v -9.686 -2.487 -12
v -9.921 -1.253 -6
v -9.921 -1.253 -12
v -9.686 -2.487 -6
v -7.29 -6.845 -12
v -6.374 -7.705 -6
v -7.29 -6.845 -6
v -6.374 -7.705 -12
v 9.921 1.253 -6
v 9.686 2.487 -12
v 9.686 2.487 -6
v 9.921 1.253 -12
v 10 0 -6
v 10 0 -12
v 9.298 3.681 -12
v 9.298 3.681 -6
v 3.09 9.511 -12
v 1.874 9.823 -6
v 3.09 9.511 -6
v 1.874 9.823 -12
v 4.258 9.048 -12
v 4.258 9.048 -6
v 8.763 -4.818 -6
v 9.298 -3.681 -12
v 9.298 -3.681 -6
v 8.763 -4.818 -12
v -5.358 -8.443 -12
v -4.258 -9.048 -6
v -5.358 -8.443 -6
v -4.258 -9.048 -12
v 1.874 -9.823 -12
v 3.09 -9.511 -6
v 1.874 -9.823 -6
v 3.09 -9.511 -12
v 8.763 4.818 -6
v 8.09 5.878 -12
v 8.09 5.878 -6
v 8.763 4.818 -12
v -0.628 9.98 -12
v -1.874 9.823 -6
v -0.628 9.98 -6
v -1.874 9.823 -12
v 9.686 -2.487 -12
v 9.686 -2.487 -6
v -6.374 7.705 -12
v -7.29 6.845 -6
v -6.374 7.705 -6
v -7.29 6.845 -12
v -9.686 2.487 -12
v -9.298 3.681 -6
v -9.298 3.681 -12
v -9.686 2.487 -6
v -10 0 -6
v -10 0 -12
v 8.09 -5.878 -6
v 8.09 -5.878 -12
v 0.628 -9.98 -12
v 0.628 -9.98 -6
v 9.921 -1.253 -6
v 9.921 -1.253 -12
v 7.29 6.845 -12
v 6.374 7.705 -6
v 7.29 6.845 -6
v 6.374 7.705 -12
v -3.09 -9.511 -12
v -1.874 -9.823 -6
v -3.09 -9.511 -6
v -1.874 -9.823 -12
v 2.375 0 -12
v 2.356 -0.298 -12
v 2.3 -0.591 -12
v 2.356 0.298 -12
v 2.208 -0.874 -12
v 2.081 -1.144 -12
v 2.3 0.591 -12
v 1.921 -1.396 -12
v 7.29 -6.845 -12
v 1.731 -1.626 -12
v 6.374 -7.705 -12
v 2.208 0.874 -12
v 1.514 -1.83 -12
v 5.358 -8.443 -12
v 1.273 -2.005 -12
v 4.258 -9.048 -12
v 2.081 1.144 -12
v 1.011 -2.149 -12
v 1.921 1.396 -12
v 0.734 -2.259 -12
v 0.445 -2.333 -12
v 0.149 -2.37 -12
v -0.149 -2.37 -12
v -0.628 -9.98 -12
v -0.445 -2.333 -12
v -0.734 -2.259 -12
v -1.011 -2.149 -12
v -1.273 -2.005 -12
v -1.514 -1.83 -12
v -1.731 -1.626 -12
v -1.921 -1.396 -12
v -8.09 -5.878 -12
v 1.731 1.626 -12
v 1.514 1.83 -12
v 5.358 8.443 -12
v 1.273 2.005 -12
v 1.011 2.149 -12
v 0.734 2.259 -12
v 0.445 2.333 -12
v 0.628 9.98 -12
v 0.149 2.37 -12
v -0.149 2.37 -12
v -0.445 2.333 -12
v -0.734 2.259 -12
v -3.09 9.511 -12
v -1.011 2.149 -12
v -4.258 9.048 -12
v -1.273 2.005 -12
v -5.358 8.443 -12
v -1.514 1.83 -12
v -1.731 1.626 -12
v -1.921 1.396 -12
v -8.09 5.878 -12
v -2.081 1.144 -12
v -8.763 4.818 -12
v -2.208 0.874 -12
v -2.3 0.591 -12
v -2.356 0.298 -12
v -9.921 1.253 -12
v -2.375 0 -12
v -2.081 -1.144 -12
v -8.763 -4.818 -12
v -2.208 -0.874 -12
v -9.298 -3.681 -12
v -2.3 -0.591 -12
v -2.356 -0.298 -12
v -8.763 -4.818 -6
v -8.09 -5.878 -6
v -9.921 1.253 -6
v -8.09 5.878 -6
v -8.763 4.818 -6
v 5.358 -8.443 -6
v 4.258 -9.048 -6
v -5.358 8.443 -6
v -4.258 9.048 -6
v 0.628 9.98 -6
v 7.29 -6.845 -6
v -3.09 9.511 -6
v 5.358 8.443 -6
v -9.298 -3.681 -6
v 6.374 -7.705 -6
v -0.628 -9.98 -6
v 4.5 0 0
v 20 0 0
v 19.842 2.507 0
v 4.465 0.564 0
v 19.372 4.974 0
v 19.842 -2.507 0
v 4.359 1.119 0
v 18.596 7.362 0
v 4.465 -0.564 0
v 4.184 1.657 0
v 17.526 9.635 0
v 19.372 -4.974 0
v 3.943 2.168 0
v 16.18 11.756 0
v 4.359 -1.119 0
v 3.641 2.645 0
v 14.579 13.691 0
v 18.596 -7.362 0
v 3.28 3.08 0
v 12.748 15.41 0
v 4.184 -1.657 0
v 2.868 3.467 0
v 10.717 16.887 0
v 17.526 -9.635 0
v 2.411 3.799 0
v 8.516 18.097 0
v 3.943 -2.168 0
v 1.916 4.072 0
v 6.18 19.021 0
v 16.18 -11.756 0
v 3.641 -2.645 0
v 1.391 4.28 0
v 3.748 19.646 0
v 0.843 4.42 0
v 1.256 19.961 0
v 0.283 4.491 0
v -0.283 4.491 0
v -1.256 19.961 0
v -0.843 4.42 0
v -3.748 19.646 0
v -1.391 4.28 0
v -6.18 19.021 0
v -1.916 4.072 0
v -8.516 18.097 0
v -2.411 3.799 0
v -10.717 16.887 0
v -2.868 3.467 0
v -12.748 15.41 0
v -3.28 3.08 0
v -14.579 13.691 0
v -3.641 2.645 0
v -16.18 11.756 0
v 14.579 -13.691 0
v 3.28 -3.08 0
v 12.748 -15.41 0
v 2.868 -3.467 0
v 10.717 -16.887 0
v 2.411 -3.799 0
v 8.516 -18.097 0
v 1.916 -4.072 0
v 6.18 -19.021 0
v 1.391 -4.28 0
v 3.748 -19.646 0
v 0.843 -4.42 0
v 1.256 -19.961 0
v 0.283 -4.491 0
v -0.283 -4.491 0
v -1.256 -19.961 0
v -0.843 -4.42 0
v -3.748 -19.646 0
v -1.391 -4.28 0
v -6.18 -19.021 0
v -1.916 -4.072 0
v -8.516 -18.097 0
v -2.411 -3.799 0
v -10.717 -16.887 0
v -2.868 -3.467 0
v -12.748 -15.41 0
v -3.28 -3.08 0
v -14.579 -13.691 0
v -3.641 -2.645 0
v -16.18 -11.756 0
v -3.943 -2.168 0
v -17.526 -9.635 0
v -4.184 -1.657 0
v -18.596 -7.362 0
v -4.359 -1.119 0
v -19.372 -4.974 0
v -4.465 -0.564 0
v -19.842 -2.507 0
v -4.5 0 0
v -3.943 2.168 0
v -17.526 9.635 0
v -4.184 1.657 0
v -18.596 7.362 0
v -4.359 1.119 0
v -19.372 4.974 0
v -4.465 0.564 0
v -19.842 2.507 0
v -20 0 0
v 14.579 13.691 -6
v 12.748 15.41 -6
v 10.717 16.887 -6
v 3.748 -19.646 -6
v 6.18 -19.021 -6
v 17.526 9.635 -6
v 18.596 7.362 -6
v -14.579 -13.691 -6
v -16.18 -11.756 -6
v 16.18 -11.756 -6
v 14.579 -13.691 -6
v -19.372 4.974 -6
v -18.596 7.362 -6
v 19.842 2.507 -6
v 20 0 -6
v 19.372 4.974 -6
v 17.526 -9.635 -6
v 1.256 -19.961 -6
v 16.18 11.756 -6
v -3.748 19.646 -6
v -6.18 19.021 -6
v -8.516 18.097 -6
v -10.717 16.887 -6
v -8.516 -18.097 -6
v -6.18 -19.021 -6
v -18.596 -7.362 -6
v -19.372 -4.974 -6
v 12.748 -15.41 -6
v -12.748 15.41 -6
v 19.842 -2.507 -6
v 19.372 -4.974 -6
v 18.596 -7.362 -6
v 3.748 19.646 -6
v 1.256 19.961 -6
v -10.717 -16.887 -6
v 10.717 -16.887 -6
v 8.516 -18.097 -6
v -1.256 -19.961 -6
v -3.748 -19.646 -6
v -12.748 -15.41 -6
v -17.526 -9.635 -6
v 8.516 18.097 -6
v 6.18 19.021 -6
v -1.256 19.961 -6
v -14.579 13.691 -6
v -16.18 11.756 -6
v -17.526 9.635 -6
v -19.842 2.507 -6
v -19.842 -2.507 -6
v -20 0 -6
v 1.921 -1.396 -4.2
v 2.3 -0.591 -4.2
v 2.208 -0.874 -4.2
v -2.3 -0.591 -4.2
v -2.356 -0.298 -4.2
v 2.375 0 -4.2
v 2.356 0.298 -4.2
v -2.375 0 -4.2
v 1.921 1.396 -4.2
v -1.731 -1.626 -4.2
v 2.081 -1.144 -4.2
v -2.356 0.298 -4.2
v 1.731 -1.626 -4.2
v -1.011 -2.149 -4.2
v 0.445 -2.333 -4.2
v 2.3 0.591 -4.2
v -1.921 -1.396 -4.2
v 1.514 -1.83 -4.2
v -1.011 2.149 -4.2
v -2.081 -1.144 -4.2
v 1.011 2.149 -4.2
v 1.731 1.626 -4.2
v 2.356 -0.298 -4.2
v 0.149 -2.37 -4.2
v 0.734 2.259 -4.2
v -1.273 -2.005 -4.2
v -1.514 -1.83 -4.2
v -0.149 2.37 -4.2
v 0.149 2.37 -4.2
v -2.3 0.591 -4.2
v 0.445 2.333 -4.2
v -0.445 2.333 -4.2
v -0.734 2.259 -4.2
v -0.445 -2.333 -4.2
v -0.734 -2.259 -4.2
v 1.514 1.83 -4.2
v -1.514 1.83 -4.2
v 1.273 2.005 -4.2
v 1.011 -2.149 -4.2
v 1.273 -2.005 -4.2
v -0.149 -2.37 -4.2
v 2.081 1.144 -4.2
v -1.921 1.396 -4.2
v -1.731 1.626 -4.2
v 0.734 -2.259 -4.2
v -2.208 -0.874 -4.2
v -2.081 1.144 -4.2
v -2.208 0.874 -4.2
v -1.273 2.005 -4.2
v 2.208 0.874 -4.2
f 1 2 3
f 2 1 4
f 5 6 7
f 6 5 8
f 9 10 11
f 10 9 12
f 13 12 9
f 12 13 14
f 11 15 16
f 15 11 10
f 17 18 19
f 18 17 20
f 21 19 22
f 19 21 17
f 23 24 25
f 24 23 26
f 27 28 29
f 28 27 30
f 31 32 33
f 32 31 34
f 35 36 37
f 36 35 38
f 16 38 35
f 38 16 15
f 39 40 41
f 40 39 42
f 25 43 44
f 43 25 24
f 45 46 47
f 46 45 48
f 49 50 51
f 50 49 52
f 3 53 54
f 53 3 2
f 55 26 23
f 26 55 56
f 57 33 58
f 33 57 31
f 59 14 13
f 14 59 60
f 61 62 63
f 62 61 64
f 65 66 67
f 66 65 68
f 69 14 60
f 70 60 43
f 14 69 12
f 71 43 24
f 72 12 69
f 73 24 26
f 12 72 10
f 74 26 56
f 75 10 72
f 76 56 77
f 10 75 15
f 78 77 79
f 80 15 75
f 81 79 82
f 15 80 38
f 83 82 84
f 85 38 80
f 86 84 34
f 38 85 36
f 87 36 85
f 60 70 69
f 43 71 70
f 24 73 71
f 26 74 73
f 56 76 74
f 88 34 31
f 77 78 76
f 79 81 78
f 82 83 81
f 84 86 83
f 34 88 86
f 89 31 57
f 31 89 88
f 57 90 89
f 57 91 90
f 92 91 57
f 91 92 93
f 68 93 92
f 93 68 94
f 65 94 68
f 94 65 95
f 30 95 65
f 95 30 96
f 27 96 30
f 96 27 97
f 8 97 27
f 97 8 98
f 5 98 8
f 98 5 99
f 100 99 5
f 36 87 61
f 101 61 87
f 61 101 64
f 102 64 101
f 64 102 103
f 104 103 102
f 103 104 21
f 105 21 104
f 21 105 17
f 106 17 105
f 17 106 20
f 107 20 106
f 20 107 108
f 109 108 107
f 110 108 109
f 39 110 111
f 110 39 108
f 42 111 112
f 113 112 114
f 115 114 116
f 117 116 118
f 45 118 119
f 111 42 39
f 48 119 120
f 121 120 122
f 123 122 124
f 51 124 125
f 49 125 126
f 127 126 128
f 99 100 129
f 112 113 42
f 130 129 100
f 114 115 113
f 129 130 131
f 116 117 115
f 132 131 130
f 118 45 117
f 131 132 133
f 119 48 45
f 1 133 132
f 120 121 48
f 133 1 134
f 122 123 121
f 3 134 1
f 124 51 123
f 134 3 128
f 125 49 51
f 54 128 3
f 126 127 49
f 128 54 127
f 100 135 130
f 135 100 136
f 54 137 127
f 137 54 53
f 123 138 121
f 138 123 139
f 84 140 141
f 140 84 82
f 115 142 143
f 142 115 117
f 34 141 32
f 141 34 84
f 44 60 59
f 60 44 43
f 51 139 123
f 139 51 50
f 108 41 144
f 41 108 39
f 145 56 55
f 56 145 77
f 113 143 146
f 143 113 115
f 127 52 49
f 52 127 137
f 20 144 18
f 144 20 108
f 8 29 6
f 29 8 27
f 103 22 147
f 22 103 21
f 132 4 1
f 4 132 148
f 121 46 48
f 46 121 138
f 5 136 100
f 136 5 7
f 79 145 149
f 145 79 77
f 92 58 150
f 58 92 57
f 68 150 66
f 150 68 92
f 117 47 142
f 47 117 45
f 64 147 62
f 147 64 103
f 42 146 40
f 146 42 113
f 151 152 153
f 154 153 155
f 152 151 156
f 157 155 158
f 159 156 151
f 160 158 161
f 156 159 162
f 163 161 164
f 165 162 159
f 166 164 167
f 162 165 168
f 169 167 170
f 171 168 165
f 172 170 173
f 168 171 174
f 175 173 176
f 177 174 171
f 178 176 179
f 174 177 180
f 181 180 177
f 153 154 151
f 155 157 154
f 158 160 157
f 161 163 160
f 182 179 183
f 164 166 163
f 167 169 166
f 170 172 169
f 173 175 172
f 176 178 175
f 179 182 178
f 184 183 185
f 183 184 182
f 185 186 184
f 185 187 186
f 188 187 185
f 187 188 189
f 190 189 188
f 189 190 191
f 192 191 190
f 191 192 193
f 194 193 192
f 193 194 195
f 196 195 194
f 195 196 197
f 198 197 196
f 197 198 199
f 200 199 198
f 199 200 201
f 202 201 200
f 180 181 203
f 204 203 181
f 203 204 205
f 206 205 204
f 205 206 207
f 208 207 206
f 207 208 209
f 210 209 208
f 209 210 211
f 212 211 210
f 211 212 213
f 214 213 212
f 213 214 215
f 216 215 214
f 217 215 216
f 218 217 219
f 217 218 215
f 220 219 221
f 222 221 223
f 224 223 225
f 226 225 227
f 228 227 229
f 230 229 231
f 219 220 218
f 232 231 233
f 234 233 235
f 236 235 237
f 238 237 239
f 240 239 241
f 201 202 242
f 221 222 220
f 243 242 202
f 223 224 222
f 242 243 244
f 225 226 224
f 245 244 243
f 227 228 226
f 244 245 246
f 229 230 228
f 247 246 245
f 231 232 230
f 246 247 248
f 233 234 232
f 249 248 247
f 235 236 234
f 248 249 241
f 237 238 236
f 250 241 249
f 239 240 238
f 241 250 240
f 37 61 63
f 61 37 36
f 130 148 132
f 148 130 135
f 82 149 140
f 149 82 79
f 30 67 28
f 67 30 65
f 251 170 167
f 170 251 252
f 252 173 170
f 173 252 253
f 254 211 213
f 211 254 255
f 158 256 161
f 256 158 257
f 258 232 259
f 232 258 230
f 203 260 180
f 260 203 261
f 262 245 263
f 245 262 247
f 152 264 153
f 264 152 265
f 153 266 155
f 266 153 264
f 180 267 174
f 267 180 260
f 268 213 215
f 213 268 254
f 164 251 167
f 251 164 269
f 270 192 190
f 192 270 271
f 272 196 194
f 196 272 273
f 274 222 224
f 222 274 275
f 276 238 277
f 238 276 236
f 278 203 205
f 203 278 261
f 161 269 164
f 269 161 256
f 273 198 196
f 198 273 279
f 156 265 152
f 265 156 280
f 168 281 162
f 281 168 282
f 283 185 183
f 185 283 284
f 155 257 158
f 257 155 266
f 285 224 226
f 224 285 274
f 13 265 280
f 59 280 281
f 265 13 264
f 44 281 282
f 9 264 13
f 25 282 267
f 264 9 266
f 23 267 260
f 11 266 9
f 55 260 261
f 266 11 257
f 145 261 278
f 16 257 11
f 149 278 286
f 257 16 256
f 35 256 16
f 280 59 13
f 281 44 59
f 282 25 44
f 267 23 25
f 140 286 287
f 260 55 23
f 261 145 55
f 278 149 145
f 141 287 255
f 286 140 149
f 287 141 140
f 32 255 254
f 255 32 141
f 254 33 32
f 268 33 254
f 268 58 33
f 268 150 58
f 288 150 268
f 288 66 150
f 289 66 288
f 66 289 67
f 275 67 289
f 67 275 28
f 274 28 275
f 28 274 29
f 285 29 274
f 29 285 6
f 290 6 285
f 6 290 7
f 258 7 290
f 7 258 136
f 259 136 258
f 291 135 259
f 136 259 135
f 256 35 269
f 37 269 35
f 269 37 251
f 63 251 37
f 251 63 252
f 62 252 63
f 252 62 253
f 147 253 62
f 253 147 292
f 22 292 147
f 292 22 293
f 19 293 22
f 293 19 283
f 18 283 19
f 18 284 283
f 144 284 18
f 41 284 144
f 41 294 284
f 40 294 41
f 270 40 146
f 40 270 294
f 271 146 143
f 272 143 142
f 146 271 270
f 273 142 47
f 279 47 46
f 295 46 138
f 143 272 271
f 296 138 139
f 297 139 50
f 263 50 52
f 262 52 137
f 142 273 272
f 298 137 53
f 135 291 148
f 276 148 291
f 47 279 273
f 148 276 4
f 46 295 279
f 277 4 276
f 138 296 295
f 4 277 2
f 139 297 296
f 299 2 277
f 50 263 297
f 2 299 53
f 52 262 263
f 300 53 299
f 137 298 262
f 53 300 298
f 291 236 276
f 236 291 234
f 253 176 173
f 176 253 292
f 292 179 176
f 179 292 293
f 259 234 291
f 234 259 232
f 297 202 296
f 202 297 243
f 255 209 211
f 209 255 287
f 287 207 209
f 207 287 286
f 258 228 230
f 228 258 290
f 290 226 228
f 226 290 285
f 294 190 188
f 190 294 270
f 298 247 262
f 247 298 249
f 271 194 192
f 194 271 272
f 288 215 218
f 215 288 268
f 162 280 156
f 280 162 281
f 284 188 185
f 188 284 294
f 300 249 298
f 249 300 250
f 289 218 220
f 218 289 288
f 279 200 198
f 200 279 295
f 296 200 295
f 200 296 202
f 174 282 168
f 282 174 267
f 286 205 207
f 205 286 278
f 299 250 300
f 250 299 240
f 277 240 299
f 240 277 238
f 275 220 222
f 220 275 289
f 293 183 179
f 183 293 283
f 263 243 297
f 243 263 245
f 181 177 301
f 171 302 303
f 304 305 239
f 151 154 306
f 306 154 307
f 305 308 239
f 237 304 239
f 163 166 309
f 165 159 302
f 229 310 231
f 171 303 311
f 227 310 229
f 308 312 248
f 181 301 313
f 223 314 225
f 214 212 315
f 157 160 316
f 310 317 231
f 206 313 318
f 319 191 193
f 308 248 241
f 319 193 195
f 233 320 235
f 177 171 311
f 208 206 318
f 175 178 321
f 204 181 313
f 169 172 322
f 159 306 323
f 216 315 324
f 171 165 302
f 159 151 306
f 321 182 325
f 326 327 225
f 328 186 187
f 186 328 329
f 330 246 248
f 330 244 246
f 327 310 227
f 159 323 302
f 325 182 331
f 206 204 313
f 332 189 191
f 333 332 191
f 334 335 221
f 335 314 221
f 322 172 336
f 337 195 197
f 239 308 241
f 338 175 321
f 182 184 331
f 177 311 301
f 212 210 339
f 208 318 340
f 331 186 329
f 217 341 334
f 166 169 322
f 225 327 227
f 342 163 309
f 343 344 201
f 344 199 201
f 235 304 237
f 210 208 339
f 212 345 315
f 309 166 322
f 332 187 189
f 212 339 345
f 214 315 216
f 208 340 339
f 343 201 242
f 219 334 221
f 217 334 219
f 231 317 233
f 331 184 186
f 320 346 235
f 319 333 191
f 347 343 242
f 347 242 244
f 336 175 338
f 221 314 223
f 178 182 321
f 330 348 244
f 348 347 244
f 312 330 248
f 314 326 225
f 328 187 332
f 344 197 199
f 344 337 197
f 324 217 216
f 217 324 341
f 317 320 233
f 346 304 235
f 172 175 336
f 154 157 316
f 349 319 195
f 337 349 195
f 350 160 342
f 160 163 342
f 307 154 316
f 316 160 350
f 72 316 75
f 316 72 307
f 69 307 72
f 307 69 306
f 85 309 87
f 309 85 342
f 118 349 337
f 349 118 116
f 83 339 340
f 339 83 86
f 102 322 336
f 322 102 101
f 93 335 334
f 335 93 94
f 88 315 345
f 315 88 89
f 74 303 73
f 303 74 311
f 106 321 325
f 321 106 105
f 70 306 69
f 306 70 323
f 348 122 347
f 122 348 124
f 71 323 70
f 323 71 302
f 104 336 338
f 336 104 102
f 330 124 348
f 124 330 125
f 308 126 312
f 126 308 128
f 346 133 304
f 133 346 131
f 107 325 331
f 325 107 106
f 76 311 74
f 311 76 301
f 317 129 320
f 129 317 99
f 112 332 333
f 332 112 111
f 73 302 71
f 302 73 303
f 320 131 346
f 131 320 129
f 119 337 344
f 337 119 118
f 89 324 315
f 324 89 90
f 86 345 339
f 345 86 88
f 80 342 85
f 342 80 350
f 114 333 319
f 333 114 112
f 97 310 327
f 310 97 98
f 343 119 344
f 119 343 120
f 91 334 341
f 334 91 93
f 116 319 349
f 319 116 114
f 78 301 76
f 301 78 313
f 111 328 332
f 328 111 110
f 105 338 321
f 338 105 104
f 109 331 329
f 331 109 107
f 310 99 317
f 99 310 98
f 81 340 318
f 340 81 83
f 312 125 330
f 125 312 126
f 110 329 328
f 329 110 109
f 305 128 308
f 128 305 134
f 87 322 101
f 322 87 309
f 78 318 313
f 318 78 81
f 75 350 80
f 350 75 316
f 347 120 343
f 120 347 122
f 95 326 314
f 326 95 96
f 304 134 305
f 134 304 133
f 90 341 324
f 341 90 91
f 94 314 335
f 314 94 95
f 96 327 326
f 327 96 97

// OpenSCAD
$fn = 50;


difference() {
	union() {
		translate(v = [0, 0, -12.0000000000]) {
			cylinder(h = 12, r = 10.0000000000);
		}
		translate(v = [0, 0, -6.0000000000]) {
			cylinder(h = 6, r = 20.0000000000);
		}
	}
	union() {
		translate(v = [0, 0, 0]) {
			rotate(a = [0, 0, 0]) {
				difference() {
					union() {
						#translate(v = [0, 0, -12.0000000000]) {
							cylinder(h = 12, r = 2.2500000000);
						}
						#translate(v = [0, 0, -4.2000000000]) {
							cylinder(h = 4.2000000000, r1 = 2.3750000000, r2 = 4.5000000000);
						}
						#translate(v = [0, 0, -12.0000000000]) {
							cylinder(h = 12, r = 2.3750000000);
						}
						#translate(v = [0, 0, -12.0000000000]) {
							cylinder(h = 12, r = 2.2500000000);
						}
					}
					union();
				}
			}
		}
	}
}
